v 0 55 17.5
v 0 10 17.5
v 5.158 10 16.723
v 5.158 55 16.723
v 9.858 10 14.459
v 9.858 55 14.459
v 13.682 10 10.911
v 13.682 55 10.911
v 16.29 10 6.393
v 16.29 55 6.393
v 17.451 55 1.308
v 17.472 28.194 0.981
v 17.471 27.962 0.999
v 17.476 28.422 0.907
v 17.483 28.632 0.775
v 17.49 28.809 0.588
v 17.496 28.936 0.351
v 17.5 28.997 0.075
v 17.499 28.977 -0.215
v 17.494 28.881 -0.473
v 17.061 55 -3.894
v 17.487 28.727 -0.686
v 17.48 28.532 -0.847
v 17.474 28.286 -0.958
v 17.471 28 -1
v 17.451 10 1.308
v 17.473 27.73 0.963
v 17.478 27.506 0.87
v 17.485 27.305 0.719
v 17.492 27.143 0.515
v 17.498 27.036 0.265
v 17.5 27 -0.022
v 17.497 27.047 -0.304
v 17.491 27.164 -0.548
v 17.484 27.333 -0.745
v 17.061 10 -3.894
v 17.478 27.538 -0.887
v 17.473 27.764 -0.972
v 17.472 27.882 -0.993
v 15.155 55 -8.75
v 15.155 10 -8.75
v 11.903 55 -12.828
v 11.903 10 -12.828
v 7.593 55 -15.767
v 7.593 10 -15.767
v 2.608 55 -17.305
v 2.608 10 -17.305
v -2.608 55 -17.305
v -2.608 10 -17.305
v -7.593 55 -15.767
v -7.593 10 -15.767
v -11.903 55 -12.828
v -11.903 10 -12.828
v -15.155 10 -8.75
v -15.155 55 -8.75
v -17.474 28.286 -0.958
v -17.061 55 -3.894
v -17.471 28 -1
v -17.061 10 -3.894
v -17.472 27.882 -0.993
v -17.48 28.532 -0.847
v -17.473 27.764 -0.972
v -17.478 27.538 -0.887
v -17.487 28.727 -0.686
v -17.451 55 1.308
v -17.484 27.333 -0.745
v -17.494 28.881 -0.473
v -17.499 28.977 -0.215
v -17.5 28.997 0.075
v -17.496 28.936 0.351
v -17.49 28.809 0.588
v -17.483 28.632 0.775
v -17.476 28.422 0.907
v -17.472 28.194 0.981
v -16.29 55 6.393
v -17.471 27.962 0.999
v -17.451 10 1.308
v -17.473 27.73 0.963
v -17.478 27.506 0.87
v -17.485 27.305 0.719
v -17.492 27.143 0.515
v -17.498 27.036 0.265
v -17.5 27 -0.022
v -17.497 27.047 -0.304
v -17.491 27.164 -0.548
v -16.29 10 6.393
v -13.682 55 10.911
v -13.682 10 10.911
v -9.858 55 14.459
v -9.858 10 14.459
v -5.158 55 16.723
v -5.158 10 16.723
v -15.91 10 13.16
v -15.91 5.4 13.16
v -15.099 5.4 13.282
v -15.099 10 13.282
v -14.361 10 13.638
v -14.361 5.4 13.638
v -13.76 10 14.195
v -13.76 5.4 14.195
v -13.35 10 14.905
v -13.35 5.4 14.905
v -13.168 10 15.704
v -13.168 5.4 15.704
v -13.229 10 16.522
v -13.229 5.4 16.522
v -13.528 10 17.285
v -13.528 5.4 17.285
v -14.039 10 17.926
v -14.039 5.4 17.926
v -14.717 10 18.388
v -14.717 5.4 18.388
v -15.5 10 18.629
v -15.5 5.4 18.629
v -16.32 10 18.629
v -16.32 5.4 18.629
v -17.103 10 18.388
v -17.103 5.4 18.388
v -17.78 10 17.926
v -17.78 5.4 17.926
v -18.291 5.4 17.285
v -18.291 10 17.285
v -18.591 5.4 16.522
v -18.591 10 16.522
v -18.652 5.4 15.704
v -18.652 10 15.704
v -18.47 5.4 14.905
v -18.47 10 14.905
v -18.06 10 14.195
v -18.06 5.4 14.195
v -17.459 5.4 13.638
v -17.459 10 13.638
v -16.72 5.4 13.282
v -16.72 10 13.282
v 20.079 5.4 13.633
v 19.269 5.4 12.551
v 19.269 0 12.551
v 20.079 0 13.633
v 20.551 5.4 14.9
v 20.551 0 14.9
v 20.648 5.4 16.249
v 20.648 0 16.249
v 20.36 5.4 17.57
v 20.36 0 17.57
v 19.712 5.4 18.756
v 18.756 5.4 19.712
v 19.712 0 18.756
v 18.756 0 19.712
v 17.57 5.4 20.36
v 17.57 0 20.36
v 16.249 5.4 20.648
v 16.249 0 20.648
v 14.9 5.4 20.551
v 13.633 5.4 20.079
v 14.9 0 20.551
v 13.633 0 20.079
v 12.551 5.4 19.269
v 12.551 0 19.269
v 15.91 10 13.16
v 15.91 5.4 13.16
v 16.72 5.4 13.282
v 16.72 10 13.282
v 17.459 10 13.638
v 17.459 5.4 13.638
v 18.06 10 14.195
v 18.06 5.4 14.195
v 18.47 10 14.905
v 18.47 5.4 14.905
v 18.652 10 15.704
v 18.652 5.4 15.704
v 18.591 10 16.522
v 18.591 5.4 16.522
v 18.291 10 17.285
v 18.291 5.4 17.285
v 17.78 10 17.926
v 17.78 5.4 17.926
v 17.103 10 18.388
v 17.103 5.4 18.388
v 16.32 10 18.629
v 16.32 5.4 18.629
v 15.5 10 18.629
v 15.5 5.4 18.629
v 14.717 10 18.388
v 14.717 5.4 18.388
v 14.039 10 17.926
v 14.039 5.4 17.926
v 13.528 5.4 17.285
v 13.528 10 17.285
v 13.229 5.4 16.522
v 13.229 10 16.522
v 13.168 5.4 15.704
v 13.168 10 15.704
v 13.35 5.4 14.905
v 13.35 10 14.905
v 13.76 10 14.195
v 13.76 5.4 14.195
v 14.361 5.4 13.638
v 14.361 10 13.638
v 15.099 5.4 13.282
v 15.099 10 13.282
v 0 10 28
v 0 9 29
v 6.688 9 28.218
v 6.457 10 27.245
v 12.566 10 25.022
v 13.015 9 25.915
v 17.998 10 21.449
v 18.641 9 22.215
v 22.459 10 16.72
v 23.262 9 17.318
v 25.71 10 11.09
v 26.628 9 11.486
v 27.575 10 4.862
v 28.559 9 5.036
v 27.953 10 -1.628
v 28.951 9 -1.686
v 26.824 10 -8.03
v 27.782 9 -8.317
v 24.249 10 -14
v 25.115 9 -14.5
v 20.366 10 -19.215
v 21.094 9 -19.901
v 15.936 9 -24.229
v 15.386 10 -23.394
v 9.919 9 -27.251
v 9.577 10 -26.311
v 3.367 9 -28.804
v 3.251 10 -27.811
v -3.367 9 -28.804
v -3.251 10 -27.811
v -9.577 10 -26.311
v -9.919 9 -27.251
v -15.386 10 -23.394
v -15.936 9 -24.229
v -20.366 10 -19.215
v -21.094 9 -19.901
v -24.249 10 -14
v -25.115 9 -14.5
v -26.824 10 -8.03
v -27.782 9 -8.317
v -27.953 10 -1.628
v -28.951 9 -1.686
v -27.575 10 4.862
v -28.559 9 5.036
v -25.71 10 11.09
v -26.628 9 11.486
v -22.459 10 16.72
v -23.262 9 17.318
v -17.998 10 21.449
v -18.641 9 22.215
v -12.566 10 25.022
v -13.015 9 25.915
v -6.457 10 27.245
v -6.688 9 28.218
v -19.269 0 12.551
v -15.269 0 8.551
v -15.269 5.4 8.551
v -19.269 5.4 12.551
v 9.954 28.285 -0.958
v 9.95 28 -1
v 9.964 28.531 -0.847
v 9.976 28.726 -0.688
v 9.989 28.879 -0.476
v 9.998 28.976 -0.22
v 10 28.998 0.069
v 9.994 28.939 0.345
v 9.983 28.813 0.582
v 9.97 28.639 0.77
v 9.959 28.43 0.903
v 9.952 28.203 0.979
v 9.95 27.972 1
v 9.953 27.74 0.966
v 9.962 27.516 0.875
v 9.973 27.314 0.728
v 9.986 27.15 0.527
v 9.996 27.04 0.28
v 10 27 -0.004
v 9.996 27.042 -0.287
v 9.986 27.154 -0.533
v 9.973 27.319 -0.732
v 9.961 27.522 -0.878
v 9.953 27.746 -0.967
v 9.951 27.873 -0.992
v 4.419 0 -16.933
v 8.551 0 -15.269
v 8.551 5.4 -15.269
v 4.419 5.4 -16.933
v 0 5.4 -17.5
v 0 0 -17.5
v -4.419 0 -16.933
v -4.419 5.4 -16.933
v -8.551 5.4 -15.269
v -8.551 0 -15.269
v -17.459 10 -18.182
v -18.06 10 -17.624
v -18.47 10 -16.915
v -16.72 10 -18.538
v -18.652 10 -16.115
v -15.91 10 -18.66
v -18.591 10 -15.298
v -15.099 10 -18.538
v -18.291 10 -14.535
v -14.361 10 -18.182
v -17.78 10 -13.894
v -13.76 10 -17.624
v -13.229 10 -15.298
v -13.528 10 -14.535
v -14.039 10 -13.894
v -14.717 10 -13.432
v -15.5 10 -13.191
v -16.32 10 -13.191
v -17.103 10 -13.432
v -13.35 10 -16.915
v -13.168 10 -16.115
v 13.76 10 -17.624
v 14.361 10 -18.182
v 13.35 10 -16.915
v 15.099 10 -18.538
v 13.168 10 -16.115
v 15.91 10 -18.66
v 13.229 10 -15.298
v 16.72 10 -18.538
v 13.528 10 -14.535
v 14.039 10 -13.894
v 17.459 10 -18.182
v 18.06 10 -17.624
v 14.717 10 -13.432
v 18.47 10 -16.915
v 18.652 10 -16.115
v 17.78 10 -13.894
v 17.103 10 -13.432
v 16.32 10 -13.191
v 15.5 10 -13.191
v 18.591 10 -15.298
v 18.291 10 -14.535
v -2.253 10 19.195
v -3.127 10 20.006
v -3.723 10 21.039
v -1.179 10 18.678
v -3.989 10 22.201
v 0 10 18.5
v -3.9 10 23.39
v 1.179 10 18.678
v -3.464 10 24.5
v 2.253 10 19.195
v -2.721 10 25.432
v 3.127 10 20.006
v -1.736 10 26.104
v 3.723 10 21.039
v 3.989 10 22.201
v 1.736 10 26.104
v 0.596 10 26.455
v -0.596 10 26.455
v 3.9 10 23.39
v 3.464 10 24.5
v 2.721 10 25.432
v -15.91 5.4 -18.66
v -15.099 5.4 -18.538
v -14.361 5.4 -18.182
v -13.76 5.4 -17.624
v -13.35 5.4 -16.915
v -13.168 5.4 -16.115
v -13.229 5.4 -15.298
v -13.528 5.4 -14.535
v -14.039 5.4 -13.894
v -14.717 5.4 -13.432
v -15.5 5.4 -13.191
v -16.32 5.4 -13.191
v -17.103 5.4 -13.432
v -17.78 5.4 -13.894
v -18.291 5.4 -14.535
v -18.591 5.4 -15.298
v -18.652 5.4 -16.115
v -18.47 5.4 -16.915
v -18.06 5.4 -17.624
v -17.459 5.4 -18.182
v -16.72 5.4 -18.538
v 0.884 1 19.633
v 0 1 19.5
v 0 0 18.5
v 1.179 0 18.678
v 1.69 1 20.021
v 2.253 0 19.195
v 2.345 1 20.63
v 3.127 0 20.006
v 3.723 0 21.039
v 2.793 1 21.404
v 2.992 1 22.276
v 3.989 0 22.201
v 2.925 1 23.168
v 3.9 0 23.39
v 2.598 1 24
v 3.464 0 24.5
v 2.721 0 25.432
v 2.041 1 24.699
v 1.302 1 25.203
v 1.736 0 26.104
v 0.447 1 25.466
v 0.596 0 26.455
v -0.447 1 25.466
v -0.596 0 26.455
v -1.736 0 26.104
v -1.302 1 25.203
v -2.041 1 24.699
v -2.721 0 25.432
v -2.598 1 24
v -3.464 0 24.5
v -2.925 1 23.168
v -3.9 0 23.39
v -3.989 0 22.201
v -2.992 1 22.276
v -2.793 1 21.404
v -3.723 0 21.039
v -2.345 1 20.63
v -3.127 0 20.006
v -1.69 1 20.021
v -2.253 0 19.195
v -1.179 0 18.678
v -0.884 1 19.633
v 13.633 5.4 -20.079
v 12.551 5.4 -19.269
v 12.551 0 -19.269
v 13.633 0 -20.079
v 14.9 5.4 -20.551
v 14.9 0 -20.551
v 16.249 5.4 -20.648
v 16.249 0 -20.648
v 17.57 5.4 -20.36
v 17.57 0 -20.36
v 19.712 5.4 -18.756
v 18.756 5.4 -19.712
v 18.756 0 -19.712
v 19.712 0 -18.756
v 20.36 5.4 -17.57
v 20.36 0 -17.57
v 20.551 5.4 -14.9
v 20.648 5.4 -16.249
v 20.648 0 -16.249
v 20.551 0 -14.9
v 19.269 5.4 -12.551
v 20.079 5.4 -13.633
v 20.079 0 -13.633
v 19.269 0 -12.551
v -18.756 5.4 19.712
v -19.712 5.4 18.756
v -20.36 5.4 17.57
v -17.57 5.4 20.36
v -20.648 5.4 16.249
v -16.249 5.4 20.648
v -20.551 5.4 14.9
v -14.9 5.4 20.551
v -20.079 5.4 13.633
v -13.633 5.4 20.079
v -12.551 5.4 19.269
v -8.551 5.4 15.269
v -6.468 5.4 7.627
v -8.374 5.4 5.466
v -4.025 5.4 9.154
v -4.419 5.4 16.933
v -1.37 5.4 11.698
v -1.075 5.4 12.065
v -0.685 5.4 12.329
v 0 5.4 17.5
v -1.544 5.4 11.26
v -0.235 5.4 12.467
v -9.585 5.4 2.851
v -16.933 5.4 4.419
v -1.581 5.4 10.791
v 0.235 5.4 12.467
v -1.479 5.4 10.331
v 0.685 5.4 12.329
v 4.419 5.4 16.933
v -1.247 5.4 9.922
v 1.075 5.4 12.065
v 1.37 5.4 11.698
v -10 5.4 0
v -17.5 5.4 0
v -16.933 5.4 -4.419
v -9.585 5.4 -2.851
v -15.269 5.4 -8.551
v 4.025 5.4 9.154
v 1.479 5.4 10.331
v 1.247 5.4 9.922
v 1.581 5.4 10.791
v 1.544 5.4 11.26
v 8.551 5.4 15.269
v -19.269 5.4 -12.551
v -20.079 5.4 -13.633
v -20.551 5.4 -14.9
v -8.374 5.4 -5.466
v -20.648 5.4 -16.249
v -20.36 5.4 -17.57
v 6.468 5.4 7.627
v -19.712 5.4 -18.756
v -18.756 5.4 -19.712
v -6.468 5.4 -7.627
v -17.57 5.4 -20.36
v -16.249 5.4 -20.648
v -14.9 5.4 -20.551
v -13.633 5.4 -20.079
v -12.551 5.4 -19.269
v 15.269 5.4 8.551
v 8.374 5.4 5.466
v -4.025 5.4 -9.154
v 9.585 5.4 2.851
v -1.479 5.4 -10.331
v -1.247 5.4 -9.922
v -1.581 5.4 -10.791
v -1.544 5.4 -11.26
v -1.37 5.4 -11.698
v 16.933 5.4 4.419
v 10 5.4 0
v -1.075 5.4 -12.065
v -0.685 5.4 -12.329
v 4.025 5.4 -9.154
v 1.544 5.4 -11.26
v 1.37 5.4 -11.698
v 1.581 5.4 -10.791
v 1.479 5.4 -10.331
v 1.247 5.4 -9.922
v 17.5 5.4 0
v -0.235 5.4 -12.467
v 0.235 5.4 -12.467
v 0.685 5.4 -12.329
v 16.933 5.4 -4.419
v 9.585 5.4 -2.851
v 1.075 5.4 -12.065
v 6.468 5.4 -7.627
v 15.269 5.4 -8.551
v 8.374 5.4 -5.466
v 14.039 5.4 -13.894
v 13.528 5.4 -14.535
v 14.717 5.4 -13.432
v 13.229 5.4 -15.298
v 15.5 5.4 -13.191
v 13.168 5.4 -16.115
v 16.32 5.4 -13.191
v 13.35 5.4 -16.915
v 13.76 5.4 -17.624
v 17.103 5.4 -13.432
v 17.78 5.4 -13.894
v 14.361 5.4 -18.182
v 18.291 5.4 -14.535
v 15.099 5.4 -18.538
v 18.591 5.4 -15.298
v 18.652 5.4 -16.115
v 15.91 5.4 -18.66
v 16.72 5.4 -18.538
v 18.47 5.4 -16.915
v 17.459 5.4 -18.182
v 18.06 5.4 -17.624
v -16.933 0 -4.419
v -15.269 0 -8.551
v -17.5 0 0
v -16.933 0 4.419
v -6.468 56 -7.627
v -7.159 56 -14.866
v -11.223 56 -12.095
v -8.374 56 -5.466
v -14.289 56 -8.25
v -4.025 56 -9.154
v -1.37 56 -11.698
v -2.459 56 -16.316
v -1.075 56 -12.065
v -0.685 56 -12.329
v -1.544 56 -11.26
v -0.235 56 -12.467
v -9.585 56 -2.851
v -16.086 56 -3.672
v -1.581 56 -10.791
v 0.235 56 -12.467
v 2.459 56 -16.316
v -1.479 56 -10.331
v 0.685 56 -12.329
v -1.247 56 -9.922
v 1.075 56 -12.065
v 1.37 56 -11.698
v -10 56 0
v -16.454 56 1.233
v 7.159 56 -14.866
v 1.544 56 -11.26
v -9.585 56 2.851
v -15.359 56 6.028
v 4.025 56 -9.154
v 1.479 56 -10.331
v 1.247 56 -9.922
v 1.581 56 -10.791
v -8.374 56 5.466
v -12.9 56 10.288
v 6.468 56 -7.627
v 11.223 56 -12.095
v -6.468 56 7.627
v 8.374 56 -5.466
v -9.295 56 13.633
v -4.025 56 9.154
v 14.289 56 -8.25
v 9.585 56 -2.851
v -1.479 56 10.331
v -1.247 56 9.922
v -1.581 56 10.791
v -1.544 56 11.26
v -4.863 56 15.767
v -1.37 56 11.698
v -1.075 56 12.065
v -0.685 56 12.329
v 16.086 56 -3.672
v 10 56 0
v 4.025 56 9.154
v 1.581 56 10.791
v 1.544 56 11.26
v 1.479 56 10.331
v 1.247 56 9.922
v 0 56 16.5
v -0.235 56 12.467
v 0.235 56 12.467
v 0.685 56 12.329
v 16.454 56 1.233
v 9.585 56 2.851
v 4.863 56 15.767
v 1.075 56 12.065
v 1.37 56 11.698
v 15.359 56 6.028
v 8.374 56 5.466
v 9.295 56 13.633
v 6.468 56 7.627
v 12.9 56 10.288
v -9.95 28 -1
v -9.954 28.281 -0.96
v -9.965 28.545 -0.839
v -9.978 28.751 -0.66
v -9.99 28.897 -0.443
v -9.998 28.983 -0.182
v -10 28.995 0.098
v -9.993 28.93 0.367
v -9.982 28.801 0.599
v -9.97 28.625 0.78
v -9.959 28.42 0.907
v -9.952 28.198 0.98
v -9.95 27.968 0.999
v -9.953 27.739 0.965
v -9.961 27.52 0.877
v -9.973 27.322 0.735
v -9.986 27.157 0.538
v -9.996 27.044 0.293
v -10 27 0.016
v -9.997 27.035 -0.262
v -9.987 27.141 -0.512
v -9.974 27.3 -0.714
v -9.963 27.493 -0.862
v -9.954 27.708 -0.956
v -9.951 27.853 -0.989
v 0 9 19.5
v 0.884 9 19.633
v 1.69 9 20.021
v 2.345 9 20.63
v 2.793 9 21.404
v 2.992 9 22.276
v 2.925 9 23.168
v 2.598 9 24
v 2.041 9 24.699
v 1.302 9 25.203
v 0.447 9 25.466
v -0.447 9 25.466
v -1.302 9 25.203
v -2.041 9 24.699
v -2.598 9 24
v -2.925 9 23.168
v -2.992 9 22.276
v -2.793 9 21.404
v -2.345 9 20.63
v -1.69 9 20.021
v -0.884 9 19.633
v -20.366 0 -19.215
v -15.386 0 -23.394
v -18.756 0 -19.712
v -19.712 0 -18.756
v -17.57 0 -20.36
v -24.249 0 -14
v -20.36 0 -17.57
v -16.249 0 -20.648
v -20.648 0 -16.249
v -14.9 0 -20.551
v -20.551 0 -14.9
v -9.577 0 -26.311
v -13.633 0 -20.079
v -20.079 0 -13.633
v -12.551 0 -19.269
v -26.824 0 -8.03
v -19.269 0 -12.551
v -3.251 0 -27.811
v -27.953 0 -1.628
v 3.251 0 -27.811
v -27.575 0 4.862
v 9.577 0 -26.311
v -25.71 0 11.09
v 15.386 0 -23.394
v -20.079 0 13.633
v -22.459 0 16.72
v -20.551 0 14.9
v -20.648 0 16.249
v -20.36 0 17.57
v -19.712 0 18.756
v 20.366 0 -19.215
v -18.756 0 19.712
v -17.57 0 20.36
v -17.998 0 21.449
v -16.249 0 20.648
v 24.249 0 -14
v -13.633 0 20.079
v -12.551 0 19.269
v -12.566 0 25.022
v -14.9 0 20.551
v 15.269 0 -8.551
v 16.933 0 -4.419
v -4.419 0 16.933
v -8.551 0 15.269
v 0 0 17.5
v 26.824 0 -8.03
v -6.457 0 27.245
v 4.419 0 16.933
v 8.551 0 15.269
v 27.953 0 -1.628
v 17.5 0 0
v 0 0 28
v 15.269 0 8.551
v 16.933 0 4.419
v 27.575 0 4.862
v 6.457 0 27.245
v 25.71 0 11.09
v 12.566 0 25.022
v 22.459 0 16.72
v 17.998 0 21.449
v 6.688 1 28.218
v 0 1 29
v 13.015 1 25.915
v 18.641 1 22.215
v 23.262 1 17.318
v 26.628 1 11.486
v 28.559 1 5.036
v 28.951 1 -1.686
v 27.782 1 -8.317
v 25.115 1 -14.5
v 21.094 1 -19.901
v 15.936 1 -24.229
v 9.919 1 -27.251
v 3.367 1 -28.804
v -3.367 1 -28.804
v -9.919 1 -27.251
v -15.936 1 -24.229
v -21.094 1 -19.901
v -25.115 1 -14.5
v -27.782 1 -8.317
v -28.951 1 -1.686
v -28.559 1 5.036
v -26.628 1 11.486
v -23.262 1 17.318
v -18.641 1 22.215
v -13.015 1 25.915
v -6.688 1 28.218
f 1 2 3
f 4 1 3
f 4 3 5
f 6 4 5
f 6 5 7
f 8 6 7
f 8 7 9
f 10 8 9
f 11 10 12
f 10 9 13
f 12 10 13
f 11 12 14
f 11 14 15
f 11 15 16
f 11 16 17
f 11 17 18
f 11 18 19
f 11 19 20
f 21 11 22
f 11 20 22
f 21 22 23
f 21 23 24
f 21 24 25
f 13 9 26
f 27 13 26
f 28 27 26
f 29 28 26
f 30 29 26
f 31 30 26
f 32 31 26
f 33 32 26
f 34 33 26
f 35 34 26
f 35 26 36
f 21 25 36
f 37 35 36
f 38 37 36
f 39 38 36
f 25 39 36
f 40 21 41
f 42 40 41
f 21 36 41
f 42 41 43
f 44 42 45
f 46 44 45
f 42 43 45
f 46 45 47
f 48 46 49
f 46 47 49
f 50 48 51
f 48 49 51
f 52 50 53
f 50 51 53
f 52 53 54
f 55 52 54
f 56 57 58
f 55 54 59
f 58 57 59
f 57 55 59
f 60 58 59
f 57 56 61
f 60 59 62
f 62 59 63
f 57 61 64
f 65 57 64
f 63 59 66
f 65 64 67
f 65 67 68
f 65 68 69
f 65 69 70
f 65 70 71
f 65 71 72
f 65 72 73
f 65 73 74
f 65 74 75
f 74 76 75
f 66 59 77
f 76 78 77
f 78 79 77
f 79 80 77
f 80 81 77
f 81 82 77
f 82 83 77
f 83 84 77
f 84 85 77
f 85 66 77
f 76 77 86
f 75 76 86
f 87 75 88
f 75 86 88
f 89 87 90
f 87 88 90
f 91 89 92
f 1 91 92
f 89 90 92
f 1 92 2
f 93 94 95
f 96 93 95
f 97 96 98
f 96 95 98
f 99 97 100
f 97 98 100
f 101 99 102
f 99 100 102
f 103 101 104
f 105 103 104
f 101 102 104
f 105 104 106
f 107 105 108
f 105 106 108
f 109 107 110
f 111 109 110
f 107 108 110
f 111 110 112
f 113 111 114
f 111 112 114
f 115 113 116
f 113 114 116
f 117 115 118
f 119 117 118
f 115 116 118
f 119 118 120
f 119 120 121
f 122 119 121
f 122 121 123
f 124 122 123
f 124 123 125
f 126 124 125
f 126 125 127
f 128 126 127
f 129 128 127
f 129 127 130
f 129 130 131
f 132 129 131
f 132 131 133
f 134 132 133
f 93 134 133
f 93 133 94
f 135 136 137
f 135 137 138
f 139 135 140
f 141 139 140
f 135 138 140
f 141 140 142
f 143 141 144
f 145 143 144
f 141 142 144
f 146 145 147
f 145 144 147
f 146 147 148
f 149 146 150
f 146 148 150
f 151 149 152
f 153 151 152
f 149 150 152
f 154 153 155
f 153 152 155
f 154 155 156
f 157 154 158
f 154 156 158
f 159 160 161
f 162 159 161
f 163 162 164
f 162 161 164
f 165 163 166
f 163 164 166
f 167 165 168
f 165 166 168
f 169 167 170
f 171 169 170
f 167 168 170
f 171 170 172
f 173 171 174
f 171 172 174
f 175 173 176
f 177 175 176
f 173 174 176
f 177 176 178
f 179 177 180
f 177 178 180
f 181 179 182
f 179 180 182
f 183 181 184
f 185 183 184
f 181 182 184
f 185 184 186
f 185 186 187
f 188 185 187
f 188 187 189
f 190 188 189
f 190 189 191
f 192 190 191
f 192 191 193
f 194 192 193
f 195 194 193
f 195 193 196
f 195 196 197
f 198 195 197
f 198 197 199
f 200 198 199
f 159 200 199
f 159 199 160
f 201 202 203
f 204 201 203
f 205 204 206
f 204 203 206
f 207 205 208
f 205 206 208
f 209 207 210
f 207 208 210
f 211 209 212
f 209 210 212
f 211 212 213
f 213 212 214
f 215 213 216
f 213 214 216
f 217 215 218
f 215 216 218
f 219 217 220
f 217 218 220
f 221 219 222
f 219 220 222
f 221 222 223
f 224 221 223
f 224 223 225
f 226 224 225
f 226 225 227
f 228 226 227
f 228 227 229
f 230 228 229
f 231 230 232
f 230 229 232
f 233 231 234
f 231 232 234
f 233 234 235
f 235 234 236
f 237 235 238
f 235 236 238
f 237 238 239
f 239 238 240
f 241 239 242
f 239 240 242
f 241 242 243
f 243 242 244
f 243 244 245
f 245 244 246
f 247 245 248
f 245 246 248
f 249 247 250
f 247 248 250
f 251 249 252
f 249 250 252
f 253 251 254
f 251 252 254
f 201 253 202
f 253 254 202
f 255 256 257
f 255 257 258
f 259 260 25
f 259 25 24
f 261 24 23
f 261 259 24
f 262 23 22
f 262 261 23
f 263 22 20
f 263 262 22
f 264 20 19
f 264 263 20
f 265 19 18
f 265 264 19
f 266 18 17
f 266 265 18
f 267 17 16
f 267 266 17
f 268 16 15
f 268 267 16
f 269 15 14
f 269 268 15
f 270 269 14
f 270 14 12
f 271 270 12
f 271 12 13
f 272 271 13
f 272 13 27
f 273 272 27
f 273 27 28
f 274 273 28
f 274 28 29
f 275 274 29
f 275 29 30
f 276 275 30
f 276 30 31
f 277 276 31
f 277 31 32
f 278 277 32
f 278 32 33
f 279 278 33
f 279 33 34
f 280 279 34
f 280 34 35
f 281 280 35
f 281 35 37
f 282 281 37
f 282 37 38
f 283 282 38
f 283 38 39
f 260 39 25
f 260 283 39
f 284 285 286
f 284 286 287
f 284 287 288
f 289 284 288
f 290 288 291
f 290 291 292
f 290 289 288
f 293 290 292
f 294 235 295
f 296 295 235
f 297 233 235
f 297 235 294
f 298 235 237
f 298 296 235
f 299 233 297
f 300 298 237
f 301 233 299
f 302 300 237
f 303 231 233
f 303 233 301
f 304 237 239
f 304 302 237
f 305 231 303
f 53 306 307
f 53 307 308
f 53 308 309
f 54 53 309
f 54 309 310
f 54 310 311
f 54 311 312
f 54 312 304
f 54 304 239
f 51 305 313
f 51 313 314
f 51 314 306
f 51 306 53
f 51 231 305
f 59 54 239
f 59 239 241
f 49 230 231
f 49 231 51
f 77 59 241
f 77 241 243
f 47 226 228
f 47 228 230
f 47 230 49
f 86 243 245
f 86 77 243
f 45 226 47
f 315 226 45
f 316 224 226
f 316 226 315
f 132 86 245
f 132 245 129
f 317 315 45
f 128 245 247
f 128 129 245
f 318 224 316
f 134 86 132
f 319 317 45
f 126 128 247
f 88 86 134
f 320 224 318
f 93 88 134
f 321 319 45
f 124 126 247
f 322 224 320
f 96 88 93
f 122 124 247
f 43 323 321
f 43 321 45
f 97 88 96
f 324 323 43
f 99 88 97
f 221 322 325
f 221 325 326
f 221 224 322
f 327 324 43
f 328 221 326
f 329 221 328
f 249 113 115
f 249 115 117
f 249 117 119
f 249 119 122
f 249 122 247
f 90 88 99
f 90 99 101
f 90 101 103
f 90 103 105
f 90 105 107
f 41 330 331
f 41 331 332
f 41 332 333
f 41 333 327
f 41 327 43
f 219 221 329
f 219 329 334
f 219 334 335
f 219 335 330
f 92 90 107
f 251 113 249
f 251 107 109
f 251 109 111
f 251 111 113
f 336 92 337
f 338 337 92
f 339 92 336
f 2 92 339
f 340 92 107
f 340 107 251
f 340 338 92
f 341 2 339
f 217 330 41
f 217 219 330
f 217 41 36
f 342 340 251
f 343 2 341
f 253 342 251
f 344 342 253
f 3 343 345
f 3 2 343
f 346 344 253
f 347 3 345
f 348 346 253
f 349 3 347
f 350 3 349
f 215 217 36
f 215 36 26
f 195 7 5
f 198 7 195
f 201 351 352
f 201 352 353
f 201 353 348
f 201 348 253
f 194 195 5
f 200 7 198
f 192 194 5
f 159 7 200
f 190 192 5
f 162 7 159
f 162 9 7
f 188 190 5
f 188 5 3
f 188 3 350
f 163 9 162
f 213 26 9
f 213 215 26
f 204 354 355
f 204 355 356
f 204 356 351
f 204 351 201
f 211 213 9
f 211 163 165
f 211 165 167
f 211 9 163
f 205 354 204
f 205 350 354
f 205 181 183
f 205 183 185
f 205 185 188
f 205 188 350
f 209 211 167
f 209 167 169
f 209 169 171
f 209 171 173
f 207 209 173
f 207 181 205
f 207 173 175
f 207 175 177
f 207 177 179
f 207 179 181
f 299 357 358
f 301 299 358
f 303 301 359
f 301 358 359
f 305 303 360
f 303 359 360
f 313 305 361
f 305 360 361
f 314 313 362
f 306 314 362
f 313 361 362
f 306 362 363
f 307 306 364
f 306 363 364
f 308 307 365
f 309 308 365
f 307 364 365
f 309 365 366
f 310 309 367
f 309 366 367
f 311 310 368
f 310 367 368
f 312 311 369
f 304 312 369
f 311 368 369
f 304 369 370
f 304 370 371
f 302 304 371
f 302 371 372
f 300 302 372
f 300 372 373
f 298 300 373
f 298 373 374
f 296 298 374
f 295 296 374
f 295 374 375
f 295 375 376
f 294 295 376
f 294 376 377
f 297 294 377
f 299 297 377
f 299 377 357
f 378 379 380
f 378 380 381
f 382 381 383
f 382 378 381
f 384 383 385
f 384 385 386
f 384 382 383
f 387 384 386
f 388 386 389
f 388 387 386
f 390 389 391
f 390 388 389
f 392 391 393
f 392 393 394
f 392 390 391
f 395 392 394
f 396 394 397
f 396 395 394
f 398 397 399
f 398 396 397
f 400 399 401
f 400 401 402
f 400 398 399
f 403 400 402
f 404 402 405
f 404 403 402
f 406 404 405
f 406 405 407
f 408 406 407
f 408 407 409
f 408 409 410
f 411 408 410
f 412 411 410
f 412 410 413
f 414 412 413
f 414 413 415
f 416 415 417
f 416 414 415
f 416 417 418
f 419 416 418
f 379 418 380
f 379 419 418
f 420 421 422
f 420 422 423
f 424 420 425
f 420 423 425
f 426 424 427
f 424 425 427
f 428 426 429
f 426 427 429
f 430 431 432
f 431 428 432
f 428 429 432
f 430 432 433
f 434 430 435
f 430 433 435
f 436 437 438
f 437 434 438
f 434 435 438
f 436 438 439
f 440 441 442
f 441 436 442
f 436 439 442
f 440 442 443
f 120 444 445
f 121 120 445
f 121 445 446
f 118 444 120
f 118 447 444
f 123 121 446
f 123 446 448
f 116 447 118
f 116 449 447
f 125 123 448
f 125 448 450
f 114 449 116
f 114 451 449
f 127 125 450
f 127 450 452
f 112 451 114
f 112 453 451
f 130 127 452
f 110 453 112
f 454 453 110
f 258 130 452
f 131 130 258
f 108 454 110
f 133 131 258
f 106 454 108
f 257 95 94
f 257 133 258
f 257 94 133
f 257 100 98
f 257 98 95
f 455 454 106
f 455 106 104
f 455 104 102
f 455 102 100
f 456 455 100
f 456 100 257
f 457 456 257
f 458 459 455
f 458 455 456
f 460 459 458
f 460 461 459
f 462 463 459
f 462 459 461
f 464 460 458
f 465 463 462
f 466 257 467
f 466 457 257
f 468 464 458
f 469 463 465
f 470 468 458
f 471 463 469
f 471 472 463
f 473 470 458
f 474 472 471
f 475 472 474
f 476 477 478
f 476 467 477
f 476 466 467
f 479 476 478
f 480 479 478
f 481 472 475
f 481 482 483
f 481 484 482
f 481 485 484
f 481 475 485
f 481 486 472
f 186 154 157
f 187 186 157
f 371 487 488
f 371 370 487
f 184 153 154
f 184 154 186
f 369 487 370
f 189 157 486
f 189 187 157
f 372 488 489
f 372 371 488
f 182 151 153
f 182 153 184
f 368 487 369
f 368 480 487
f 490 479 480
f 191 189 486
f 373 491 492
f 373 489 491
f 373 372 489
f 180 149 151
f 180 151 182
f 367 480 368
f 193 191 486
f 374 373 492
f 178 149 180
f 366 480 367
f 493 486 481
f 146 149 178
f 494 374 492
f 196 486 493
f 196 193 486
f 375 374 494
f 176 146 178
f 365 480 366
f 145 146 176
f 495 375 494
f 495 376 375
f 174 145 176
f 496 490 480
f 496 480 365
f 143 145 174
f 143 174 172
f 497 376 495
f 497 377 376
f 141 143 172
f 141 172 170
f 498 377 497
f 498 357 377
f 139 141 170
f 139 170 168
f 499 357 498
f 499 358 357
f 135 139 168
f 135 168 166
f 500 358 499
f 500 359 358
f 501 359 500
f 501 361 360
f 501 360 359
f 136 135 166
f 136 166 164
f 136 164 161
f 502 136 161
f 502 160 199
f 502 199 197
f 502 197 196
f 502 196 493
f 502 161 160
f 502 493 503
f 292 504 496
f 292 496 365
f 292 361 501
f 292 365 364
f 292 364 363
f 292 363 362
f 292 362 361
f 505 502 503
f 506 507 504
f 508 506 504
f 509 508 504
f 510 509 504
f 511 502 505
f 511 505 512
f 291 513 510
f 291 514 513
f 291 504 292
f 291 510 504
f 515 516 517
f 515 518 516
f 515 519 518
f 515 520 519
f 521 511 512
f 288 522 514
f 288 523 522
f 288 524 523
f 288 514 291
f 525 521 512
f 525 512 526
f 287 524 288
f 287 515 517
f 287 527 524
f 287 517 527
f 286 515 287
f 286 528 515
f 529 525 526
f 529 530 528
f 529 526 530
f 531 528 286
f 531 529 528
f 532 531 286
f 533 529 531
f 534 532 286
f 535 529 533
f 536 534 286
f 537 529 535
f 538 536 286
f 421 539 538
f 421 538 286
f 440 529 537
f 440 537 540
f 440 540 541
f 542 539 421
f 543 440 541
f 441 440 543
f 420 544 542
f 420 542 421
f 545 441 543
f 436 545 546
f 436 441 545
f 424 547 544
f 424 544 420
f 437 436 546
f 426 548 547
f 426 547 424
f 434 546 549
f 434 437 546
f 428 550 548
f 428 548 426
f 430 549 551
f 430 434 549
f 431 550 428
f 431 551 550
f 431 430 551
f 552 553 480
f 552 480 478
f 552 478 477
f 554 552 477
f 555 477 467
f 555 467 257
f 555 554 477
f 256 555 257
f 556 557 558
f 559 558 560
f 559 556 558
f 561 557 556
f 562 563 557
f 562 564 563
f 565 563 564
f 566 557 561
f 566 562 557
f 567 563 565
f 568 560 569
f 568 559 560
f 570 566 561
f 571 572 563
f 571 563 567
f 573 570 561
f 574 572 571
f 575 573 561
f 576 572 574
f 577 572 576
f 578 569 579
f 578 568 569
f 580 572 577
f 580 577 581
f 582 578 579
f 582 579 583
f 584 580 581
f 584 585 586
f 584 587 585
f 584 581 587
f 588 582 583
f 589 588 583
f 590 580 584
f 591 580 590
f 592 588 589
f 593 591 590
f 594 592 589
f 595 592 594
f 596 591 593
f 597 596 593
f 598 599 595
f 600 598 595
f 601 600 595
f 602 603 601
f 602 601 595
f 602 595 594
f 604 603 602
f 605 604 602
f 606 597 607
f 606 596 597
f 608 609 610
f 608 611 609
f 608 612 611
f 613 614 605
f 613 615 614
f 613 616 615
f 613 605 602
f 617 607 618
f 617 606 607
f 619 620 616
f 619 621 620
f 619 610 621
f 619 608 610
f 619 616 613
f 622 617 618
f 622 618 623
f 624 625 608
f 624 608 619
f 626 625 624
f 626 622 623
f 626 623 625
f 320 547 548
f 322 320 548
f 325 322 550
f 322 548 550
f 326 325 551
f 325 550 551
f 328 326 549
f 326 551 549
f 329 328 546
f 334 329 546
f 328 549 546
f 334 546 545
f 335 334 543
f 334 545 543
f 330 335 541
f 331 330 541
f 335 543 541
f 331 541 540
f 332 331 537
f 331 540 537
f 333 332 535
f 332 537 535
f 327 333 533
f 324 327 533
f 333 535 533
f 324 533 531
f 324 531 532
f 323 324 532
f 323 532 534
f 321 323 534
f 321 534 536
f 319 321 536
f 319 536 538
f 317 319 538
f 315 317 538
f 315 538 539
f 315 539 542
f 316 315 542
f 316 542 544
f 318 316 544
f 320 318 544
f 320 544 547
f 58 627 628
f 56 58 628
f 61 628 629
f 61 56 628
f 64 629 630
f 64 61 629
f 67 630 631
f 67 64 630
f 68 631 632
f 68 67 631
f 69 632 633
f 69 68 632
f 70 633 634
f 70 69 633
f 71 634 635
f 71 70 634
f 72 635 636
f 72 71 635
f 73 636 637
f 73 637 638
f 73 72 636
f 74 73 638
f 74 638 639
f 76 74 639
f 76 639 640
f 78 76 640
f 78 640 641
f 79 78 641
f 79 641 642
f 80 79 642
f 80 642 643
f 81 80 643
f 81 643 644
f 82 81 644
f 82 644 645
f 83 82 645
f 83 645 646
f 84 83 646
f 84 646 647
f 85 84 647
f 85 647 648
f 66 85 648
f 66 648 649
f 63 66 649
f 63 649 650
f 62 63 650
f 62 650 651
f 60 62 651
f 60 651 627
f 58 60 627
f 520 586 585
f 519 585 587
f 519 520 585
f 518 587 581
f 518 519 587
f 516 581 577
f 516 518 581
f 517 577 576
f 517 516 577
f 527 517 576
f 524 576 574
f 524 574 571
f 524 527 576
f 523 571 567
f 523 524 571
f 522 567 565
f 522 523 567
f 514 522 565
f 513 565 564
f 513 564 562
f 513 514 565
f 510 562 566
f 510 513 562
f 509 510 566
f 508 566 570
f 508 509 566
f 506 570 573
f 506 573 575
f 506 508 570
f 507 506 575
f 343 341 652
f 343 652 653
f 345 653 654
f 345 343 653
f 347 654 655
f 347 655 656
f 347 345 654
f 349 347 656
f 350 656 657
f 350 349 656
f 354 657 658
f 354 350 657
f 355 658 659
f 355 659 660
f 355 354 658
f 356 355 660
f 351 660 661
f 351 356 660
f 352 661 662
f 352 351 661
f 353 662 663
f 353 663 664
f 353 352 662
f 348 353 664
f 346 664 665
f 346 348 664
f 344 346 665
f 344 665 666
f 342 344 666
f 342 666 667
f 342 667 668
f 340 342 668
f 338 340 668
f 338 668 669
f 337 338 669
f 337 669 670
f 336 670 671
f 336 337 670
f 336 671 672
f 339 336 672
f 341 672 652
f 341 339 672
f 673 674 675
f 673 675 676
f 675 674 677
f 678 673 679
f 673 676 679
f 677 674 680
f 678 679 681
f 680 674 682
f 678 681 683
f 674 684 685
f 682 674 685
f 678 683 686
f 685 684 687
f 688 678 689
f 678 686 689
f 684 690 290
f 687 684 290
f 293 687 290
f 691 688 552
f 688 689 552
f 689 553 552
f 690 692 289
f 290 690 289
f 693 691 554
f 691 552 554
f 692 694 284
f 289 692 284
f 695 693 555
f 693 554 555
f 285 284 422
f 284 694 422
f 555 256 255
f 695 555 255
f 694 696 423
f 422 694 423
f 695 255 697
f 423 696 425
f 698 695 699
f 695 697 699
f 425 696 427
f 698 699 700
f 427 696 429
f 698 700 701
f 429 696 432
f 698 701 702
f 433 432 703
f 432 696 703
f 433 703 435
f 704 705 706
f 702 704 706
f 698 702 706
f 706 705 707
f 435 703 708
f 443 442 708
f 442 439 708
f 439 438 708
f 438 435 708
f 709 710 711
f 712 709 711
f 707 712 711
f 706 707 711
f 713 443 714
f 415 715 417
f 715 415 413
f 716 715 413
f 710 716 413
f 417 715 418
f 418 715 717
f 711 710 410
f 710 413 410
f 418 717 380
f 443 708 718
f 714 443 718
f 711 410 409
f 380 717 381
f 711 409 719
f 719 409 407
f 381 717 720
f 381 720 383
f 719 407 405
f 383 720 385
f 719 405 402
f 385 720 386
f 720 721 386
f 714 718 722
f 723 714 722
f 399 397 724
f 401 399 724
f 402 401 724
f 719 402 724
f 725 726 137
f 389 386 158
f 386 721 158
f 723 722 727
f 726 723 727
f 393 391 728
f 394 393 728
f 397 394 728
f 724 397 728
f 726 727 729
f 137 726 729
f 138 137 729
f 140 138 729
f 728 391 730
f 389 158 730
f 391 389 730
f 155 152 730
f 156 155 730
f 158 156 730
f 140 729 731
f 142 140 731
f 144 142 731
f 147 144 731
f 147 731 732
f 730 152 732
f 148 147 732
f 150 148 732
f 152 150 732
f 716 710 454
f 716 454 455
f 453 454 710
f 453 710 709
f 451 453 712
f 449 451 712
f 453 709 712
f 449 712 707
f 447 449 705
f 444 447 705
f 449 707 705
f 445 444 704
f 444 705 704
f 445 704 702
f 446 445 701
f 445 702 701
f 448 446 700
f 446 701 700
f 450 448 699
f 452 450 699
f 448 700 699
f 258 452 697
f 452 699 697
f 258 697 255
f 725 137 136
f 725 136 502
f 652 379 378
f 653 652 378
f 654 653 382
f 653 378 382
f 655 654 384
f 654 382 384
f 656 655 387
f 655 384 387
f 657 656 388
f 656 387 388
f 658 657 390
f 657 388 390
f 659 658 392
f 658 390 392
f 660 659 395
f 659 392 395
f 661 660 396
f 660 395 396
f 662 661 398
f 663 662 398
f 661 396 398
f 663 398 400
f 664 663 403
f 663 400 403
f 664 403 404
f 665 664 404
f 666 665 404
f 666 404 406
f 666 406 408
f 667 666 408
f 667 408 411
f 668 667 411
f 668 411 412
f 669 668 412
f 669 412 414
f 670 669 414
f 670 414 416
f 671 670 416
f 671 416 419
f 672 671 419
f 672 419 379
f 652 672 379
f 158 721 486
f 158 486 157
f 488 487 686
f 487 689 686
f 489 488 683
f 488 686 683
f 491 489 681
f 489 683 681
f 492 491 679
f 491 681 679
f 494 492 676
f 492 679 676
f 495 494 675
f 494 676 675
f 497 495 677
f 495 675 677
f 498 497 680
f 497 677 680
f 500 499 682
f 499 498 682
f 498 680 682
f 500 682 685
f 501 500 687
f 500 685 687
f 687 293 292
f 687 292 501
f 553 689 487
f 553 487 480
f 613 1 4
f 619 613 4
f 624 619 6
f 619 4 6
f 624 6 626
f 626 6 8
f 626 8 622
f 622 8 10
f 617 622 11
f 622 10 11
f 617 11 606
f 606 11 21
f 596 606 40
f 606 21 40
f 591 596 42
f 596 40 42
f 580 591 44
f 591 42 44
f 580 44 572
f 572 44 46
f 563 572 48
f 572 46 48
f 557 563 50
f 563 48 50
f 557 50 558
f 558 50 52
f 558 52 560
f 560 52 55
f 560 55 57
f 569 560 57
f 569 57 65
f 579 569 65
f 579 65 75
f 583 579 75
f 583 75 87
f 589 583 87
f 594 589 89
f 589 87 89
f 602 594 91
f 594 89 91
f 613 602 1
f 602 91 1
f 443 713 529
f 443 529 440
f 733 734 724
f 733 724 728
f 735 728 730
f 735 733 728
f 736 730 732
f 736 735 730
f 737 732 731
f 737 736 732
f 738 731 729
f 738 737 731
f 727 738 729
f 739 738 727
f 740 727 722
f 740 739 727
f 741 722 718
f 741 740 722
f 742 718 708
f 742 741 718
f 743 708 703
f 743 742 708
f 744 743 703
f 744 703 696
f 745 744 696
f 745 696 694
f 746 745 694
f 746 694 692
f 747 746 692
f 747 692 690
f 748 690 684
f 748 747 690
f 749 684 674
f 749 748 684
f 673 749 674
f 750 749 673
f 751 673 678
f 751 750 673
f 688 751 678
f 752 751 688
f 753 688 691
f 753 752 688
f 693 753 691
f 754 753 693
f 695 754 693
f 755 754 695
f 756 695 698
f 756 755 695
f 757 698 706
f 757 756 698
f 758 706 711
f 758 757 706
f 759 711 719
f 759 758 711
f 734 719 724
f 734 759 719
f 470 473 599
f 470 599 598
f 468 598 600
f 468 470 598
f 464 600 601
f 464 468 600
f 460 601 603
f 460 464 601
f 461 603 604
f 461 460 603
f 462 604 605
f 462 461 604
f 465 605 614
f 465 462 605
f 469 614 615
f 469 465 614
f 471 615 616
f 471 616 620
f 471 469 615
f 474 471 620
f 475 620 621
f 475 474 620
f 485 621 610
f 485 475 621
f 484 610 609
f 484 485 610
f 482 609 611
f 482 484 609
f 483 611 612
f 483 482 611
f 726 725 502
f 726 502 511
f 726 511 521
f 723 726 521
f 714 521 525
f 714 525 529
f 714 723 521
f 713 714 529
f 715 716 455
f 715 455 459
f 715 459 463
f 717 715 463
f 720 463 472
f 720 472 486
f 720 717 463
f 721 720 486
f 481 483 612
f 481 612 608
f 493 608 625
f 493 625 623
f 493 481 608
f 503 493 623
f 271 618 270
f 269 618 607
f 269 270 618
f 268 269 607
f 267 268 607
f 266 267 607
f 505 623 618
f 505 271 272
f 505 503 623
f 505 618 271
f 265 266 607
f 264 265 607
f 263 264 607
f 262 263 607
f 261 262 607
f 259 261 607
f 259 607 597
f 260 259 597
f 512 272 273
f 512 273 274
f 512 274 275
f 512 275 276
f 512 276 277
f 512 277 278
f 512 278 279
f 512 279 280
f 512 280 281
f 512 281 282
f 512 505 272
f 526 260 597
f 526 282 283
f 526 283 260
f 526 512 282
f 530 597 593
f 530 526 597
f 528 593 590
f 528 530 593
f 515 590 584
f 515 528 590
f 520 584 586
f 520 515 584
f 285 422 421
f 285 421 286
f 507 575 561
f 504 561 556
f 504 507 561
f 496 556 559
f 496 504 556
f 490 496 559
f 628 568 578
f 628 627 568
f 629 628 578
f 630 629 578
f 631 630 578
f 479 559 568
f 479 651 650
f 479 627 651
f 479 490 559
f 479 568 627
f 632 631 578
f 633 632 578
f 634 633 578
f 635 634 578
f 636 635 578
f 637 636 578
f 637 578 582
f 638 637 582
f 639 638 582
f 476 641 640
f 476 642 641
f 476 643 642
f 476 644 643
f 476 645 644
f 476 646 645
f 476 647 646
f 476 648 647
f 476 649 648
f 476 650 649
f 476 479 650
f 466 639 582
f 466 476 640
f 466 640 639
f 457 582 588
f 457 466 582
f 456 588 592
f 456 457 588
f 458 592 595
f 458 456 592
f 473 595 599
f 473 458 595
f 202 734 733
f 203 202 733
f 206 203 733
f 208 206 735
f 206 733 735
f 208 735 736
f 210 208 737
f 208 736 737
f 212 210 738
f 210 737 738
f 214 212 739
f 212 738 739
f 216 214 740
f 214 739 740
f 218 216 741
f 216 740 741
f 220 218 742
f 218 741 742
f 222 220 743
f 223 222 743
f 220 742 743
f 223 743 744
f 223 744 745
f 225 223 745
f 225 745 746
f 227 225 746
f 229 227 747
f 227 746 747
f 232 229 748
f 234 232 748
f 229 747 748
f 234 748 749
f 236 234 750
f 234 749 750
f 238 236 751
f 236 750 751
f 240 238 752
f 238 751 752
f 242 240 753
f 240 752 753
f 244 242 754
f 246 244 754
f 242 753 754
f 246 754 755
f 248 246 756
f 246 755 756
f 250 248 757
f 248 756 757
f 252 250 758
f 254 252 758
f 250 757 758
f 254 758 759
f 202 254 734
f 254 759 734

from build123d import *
from build123d.topology import SkipClean

# Parameters (mm, degrees)
SKETCH_1_R               = 29
EXTRUDE_1_DEPTH          = 10
SKETCH_2_R               = 17.5
EXTRUDE_2_DEPTH          = 56
SKETCH_3_R               = 10
CUT_EXTRUDE_1_DEPTH      = 56
CUT_EXTRUDE_2_REACH      = 71.412
SKETCH_4_R               = 2.75
SKETCH_4_R_2             = 3
SKETCH_4_4_R             = 4.75
SKETCH_4_4_R_2           = 2.75
CUT_EXTRUDE_3_DEPTH      = 5.4
SKETCH_3_3_R             = 10
SKETCH_3_3_R_2           = 1.585
CUT_EXTRUDE_4_DEPTH      = 56
CUT_EXTRUDE_5_DEPTH      = 70.411814556
CUT_EXTRUDE_5_DEPTH_BACK = 70.411814556
SKETCH_9_R               = 1
CUT_EXTRUDE_6_DEPTH      = 5.4
CHAMFER_1_SIZE           = 1
CHAMFER_2_SIZE           = 1
CHAMFER_3_SIZE           = 1


with BuildPart() as part:
    # 草图1 → 凸台-拉伸1 (new body)
    with BuildSketch(Plane(origin=(0, 0, 0), x_dir=(1, 0, 0), z_dir=(0, 1, 0))):
        with Locations(Location((0, 0, 0), (0, 0, 270))):
            Circle(SKETCH_1_R)
    extrude(amount=EXTRUDE_1_DEPTH)

    # 草图2 → 凸台-拉伸2 (add)
    with BuildSketch(Plane(origin=(0, 0, 0), x_dir=(1, 0, 0), z_dir=(0, 1, 0))):
        with Locations(Location((0, 0, 0), (0, 0, 270))):
            Circle(SKETCH_2_R)
    extrude(amount=EXTRUDE_2_DEPTH)

    # 草图3 → 切除-拉伸1 (cut)
    with BuildSketch(Plane(origin=(0, 0, 0), x_dir=(1, 0, 0), z_dir=(0, 1, 0))):
        with Locations(Location((0, 0, 0), (0, 0, 270))):
            Circle(SKETCH_3_R)
    extrude(amount=CUT_EXTRUDE_1_DEPTH, mode=Mode.SUBTRACT)

    # 草图4 → 切除-拉伸2 (cut, up to next)
    with BuildSketch(Plane.XZ, mode=Mode.PRIVATE) as cut_extrude_2_sk1:
        with Locations(Location((-15.909902577, 15.909902577, 0), (0, 0, 270))):
            Circle(SKETCH_4_R)
    cut_extrude_2_tool1 = extrude(cut_extrude_2_sk1.sketch, amount=-CUT_EXTRUDE_2_REACH, mode=Mode.PRIVATE) & part.part
    # 草图4 → 切除-拉伸2 (cut, up to next)
    with BuildSketch(Plane.XZ, mode=Mode.PRIVATE) as cut_extrude_2_sk2:
        with Locations(Location((-15.909902577, -15.909902577, 0), (0, 0, 270))):
            Circle(SKETCH_4_R)
    cut_extrude_2_tool2 = extrude(cut_extrude_2_sk2.sketch, amount=-CUT_EXTRUDE_2_REACH, mode=Mode.PRIVATE) & part.part
    # 草图4 → 切除-拉伸2 (cut, up to next)
    with BuildSketch(Plane.XZ, mode=Mode.PRIVATE) as cut_extrude_2_sk3:
        with Locations(Location((15.909902577, -15.909902577, 0), (0, 0, 270))):
            Circle(SKETCH_4_R)
    cut_extrude_2_tool3 = extrude(cut_extrude_2_sk3.sketch, amount=-CUT_EXTRUDE_2_REACH, mode=Mode.PRIVATE) & part.part
    # 草图4 → 切除-拉伸2 (cut, up to next)
    with BuildSketch(Plane.XZ, mode=Mode.PRIVATE) as cut_extrude_2_sk4:
        with Locations(Location((15.909902577, 15.909902577, 0), (0, 0, 270))):
            Circle(SKETCH_4_R)
    cut_extrude_2_tool4 = extrude(cut_extrude_2_sk4.sketch, amount=-CUT_EXTRUDE_2_REACH, mode=Mode.PRIVATE) & part.part
    # 草图4 → 切除-拉伸2 (cut, up to next)
    with BuildSketch(Plane.XZ, mode=Mode.PRIVATE) as cut_extrude_2_sk5:
        with Locations(Location((0, 22.5, 0), (0, 0, 270))):
            Circle(SKETCH_4_R_2)
    cut_extrude_2_tool5 = extrude(cut_extrude_2_sk5.sketch, amount=-CUT_EXTRUDE_2_REACH, mode=Mode.PRIVATE) & part.part
    add(cut_extrude_2_tool1.solids().sort_by_distance((-15.909903, 0, 15.909903))[0], mode=Mode.SUBTRACT)
    add(cut_extrude_2_tool2.solids().sort_by_distance((-15.909903, 0, -15.909903))[0], mode=Mode.SUBTRACT)
    add(cut_extrude_2_tool3.solids().sort_by_distance((15.909903, 0, -15.909903))[0], mode=Mode.SUBTRACT)
    add(cut_extrude_2_tool4.solids().sort_by_distance((15.909903, 0, 15.909903))[0], mode=Mode.SUBTRACT)
    add(cut_extrude_2_tool5.solids().sort_by_distance((0, 0, 22.5))[0], mode=Mode.SUBTRACT)

    # 草图4<4> → 切除-拉伸3 (cut)
    # profile 1 of 4: a face of its own
    with BuildSketch(Plane.XZ):
        with Locations(Location((-15.909902577, 15.909902577, 0), (0, 0, 270))):
            Circle(SKETCH_4_4_R)
        with Locations(Location((-15.909902577, 15.909902577, 0), (0, 0, 270))):
            Circle(SKETCH_4_4_R_2, mode=Mode.SUBTRACT)
    # profile 2 of 4: a face of its own
    with BuildSketch(Plane.XZ):
        with Locations(Location((15.909902577, 15.909902577, 0), (0, 0, 270))):
            Circle(SKETCH_4_4_R)
        with Locations(Location((15.909902577, 15.909902577, 0), (0, 0, 270))):
            Circle(SKETCH_4_4_R_2, mode=Mode.SUBTRACT)
    # profile 3 of 4: a face of its own
    with BuildSketch(Plane.XZ):
        with Locations(Location((15.909902577, -15.909902577, 0), (0, 0, 270))):
            Circle(SKETCH_4_4_R)
        with Locations(Location((15.909902577, -15.909902577, 0), (0, 0, 270))):
            Circle(SKETCH_4_4_R_2, mode=Mode.SUBTRACT)
    # profile 4 of 4: a face of its own
    with BuildSketch(Plane.XZ):
        with Locations(Location((-15.909902577, -15.909902577, 0), (0, 0, 270))):
            Circle(SKETCH_4_4_R)
        with Locations(Location((-15.909902577, -15.909902577, 0), (0, 0, 270))):
            Circle(SKETCH_4_4_R_2, mode=Mode.SUBTRACT)
    extrude(amount=-CUT_EXTRUDE_3_DEPTH, mode=Mode.SUBTRACT)

    # 草图3<3> → 切除-拉伸4 (cut)
    with BuildSketch(Plane(origin=(0, 0, 0), x_dir=(1, 0, 0), z_dir=(0, 1, 0))):
        Circle(SKETCH_3_3_R)
        with Locations((0, -10.9)):
            Circle(SKETCH_3_3_R_2)
        with Locations((0, 10.9)):
            Circle(SKETCH_3_3_R_2)
    extrude(amount=CUT_EXTRUDE_4_DEPTH, mode=Mode.SUBTRACT)

    # 草图9 → 切除-拉伸5 (cut, two sides: drawn at the far end of the back side and taken through both)
    with SkipClean():  # the faces are left unmerged after this step: merging them gives an invalid solid
        with BuildSketch(Plane(origin=(0, 0, 0), x_dir=(0, 0, -1), z_dir=(1, 0, 0)).offset(-CUT_EXTRUDE_5_DEPTH_BACK)):
            with Locations((0, 28)):
                Circle(SKETCH_9_R)
        extrude(amount=CUT_EXTRUDE_5_DEPTH + CUT_EXTRUDE_5_DEPTH_BACK, mode=Mode.SUBTRACT)

    # 草图11 → 切除-拉伸6 (cut)
    with BuildSketch(Plane(origin=(0, 0, 0), x_dir=(1, 0, 0), z_dir=(0, 1, 0))):
        with BuildLine():
            Line((-19.268659787, 12.551145366), (-15.26857459, 8.551060168))
            ThreePointArc((-15.26857459, 8.551060168), (-17.5, 0), (-15.26857459, -8.551060168))
            Line((-15.26857459, -8.551060168), (-19.268659787, -12.551145366))
            Line((-19.268659787, -12.551145366), (-12.551145366, -19.268659787))
            Line((-12.551145366, -19.268659787), (-8.551060168, -15.26857459))
            ThreePointArc((-8.551060168, -15.26857459), (0, -17.5), (8.551060168, -15.26857459))
            Line((8.551060168, -15.26857459), (12.551145366, -19.268659787))
            Line((12.551145366, -19.268659787), (19.268659787, -12.551145366))
            Line((19.268659787, -12.551145366), (15.26857459, -8.551060168))
            ThreePointArc((15.26857459, -8.551060168), (17.5, 0), (15.26857459, 8.551060168))
            Line((15.26857459, 8.551060168), (19.268659787, 12.551145366))
            Line((19.268659787, 12.551145366), (12.551145366, 19.268659787))
            Line((12.551145366, 19.268659787), (8.551060168, 15.26857459))
            ThreePointArc((8.551060168, 15.26857459), (0, 17.5), (-8.551060168, 15.26857459))
            Line((-8.551060168, 15.26857459), (-12.551145366, 19.268659787))
            Line((-12.551145366, 19.268659787), (-19.268659787, 12.551145366))
        make_face()
    extrude(amount=CUT_EXTRUDE_6_DEPTH, mode=Mode.SUBTRACT)

    # 倒角1
    chamfer_1_edges = [part.edges().sort_by_distance(p)[0] for p in [
        (0, 0, -29),
        (0, 10, -29),
        (0, 56, -17.5),
    ]]
    chamfer(chamfer_1_edges, length=CHAMFER_1_SIZE)

    # 倒角2
    chamfer_2_edges = [part.edges().sort_by_distance(p)[0] for p in [
        (0, 0, 25.5),
    ]]
    chamfer(chamfer_2_edges, length=CHAMFER_2_SIZE)

    # 倒角3
    chamfer_3_edges = [part.edges().sort_by_distance(p)[0] for p in [
        (0, 10, 25.5),
    ]]
    chamfer(chamfer_3_edges, length=CHAMFER_3_SIZE)


solid = part.part
